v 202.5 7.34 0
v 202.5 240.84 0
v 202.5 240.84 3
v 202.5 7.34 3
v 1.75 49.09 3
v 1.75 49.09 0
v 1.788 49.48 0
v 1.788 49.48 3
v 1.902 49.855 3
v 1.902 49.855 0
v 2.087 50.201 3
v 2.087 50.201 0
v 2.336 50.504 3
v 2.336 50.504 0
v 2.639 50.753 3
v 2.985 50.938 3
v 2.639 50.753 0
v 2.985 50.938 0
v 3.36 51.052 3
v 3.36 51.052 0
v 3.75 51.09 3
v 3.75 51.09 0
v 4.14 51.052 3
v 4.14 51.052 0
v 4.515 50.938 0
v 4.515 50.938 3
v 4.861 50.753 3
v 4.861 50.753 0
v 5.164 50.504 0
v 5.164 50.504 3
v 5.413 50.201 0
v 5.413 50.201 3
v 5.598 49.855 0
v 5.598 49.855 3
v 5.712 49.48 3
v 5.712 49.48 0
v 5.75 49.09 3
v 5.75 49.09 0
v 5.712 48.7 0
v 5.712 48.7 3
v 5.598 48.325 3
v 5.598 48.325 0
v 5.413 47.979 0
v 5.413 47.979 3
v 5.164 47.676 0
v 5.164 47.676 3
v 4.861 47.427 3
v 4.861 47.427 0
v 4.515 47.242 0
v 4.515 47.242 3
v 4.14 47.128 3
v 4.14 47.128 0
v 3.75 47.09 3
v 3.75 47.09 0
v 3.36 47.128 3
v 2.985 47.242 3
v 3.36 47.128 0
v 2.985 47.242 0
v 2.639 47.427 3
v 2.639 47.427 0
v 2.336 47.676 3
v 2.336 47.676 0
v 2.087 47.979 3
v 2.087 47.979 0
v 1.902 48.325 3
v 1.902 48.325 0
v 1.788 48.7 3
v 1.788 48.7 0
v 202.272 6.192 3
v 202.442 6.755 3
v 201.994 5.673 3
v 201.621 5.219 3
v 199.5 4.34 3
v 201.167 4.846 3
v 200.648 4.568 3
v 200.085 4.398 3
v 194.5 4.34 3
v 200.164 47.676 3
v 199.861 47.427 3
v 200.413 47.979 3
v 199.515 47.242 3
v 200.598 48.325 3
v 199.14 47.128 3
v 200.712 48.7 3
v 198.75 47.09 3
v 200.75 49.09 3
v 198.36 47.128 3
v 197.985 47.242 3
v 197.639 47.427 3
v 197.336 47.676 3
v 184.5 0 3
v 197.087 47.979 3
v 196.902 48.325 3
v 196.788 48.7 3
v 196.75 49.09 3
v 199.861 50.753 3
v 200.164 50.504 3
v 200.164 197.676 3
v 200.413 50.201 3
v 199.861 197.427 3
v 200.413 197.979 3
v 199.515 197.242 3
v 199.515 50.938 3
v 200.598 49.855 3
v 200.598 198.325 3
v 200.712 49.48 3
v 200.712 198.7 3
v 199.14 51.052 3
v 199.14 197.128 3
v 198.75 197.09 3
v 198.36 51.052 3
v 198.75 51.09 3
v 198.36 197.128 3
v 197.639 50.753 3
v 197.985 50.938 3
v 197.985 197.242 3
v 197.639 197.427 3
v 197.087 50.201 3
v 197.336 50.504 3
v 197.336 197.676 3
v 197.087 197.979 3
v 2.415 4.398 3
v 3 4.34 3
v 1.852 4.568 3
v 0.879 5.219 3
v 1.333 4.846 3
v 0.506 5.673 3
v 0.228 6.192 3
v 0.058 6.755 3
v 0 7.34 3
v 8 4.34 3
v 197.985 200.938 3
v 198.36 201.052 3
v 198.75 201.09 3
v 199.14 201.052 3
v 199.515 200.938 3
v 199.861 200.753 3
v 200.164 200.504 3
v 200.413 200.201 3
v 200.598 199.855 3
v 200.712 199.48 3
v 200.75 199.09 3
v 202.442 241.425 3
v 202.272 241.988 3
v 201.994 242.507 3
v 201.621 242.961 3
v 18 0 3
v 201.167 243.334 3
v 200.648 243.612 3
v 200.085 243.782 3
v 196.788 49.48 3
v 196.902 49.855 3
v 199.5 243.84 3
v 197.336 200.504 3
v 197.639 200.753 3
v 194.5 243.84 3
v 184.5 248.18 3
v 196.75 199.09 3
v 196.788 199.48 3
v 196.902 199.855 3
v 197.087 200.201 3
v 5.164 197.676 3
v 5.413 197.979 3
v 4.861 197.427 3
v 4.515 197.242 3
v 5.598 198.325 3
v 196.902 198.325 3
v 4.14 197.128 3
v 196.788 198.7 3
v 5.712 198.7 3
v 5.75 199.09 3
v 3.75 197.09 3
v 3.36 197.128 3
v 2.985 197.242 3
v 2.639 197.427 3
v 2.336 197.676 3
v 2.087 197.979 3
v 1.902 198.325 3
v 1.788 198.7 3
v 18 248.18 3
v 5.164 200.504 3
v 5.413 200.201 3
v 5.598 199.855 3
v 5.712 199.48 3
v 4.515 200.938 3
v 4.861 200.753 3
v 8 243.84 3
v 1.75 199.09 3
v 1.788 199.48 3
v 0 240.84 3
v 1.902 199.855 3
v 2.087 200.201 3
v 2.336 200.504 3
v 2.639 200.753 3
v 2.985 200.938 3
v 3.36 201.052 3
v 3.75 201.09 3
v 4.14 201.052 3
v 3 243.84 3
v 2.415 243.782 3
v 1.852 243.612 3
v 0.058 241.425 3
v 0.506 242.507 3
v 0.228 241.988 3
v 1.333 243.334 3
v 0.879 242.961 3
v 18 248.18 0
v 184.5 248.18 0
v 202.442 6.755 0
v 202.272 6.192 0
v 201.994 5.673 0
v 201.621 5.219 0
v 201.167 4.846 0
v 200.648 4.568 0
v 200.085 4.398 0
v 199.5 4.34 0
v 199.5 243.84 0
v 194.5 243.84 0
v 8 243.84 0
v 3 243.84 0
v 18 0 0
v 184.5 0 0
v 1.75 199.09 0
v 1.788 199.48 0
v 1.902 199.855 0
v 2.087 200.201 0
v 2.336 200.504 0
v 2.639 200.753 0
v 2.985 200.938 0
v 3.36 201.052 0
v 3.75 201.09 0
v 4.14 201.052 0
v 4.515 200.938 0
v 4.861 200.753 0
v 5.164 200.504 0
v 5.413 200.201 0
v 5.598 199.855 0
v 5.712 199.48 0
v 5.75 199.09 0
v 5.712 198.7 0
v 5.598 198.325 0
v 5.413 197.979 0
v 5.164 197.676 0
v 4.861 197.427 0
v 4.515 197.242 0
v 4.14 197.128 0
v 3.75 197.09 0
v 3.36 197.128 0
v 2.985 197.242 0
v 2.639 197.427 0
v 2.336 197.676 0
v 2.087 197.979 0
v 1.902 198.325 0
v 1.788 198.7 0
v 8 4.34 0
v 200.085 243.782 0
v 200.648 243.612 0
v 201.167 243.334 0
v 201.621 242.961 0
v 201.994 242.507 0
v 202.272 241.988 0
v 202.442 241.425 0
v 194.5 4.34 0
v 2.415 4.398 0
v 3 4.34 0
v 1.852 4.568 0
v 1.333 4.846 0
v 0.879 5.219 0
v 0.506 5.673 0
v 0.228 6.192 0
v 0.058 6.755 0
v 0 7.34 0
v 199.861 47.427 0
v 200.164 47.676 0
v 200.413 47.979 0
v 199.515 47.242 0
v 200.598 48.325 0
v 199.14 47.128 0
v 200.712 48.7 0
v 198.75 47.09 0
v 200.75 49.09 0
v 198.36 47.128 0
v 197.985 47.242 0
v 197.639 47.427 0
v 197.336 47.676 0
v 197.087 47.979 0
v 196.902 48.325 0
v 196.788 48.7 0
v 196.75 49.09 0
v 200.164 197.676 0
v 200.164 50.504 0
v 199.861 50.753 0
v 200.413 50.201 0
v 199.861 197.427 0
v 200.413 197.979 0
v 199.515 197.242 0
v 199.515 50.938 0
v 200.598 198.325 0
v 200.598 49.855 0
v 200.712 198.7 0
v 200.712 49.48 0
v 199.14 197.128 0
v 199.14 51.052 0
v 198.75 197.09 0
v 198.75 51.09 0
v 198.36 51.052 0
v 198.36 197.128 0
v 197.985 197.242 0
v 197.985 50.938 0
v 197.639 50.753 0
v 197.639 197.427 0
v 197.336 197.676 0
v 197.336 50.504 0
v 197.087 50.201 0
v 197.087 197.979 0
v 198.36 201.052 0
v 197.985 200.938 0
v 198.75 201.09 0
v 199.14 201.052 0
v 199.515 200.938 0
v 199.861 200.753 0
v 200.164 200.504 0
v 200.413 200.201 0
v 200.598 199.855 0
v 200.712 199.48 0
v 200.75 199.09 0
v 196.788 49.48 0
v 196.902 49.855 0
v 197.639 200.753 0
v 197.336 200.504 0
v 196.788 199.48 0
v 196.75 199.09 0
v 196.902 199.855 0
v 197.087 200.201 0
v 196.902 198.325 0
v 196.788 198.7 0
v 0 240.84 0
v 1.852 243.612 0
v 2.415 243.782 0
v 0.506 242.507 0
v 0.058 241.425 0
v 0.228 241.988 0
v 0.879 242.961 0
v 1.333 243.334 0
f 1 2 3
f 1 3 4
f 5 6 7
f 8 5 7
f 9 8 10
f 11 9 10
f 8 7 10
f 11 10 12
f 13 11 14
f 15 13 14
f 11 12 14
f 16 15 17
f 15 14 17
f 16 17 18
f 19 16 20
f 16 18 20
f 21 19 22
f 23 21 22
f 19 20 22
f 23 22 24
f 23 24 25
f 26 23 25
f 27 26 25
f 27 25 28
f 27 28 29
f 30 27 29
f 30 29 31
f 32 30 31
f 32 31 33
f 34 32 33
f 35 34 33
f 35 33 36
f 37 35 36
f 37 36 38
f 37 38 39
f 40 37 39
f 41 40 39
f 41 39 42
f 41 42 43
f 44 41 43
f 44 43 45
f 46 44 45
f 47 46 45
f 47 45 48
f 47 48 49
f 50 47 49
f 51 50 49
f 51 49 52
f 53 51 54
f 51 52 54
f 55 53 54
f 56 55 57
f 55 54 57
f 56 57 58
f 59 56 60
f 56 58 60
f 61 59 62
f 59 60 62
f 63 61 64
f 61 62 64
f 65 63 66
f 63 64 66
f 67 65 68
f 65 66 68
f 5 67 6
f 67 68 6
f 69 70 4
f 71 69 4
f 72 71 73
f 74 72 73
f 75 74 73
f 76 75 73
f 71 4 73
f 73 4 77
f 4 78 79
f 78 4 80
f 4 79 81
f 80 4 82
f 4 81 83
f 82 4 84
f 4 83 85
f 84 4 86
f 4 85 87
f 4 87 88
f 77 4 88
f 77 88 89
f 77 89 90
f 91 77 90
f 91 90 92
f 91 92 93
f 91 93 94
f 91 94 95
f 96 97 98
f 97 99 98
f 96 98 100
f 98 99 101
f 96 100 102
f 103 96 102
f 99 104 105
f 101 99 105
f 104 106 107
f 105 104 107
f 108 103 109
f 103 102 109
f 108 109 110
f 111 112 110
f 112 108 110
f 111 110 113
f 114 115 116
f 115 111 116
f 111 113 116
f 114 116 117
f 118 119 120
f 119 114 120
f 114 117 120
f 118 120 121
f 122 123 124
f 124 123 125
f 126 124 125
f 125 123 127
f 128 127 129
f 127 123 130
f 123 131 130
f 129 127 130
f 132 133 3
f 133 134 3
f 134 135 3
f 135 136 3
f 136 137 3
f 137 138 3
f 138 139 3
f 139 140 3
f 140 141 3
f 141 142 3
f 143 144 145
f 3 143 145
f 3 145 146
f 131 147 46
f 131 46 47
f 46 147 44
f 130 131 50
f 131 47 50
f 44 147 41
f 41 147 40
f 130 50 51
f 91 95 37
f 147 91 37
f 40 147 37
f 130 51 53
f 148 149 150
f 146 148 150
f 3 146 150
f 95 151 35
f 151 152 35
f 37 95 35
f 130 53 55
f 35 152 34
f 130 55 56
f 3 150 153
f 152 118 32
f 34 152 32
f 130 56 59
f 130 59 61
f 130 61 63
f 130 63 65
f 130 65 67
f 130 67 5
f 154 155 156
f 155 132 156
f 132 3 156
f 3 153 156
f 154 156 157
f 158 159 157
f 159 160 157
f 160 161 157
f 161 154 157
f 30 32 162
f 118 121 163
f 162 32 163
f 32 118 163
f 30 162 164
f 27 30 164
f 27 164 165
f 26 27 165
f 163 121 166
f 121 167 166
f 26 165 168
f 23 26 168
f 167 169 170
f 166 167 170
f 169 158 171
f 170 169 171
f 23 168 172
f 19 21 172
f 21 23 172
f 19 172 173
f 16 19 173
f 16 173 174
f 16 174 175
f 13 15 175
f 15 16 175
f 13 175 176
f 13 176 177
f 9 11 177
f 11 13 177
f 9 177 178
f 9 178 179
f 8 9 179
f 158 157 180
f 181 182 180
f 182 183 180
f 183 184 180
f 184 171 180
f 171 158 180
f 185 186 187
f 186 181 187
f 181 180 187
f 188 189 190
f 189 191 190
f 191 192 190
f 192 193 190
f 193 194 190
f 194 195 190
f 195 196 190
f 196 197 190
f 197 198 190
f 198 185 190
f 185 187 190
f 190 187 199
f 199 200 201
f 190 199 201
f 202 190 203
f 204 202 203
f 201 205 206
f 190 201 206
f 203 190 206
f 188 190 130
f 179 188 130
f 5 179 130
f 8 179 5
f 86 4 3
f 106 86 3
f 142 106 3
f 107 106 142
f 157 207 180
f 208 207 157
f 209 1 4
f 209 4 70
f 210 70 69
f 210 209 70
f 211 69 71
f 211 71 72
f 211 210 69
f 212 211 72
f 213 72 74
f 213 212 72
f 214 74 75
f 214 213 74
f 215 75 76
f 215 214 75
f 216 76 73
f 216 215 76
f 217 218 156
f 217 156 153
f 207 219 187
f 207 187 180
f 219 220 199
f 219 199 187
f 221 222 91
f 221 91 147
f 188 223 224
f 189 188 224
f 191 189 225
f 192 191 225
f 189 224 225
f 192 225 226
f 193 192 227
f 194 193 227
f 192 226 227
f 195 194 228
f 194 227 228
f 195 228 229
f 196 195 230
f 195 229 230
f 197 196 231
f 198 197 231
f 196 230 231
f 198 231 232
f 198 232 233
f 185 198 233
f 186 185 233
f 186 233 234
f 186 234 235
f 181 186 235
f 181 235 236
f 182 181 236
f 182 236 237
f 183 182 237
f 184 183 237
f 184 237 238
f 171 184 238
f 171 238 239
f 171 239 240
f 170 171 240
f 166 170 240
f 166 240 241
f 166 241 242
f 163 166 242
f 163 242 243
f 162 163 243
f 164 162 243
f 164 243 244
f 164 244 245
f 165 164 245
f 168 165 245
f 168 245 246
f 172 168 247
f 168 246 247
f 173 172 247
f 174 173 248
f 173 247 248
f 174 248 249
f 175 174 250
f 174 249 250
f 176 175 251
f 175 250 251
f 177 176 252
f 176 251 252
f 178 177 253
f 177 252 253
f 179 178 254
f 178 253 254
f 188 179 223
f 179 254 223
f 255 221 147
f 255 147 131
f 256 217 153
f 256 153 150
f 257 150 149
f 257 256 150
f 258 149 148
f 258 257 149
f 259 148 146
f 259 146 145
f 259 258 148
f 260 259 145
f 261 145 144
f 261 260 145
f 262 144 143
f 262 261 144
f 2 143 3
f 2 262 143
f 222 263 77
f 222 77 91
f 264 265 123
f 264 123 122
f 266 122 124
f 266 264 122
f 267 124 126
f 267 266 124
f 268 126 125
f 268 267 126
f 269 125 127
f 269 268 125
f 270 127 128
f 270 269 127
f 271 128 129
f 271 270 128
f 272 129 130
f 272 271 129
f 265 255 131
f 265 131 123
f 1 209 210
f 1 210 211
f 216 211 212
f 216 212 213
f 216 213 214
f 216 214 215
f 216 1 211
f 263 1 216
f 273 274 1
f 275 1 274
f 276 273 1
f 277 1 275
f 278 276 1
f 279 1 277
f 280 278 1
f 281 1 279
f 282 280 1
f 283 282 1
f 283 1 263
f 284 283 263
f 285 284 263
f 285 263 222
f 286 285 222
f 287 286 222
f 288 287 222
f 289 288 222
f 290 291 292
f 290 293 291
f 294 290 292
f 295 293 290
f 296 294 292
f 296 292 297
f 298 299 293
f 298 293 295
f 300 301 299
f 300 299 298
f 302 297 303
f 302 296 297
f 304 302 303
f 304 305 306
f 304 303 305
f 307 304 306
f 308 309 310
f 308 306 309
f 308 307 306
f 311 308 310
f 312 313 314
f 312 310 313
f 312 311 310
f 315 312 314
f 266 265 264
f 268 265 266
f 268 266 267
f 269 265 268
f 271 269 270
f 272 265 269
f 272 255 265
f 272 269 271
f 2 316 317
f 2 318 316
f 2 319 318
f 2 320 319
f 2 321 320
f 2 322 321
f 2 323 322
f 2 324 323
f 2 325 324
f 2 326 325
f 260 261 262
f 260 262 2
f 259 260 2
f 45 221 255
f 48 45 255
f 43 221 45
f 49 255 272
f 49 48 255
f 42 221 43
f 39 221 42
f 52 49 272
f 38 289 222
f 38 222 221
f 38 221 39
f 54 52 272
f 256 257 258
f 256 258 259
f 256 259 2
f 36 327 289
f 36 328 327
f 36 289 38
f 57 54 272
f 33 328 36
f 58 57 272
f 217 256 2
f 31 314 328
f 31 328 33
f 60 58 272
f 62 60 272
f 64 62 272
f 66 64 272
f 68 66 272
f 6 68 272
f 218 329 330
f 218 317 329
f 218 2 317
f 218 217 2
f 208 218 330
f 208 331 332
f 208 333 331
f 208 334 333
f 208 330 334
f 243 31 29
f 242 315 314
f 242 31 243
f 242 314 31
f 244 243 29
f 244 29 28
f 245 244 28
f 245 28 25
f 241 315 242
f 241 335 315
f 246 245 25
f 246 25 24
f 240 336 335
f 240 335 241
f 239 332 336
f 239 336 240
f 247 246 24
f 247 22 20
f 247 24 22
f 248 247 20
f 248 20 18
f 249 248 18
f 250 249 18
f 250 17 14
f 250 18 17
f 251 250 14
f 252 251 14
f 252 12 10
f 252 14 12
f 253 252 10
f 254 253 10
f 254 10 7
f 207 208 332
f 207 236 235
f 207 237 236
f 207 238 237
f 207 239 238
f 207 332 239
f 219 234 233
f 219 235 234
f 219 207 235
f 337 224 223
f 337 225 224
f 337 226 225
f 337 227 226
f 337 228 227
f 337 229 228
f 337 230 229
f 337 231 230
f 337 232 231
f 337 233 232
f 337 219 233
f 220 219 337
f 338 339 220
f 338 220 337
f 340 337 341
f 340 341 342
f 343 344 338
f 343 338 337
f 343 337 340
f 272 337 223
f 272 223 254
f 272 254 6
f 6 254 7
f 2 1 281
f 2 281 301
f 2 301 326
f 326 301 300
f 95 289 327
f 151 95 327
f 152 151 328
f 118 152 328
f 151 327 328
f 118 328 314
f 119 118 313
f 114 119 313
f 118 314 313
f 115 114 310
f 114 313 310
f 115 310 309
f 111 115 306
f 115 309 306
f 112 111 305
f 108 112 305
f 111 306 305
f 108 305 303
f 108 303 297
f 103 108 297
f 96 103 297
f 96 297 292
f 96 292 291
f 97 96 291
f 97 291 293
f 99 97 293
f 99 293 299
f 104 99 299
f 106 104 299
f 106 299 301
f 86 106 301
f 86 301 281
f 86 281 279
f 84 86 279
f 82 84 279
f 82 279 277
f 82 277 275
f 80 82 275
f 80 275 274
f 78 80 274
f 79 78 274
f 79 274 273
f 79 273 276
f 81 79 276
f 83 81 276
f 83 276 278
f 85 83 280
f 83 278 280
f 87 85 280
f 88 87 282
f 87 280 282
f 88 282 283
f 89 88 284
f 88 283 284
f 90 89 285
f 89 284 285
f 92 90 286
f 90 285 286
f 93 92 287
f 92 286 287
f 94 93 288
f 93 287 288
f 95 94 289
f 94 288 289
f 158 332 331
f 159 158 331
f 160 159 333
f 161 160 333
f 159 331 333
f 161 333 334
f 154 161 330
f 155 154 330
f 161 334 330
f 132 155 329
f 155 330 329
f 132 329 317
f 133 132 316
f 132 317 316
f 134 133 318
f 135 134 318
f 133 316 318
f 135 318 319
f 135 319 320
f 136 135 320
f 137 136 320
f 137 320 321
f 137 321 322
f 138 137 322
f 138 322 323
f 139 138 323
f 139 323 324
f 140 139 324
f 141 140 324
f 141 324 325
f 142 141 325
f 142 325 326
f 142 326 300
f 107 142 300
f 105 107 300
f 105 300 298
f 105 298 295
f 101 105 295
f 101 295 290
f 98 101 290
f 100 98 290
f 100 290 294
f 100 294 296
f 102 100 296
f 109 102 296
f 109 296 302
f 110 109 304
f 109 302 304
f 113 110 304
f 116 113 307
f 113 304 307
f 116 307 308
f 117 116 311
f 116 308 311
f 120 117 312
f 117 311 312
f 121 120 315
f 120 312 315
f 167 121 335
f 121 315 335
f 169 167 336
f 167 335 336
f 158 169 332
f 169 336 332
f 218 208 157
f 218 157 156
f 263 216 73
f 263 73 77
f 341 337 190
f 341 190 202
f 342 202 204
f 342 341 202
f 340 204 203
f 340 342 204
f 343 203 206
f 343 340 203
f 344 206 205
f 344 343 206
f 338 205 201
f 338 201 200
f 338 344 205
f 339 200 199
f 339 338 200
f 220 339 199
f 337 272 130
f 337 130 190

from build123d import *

# Parameters (mm, degrees)
BOSS_EXTRUDE1_DEPTH   = 3
F_4_0MM_DOWEL_HOLE1_D = 4


with BuildPart() as part:
    # Sketch1 → Boss-Extrude1 (new body)
    with BuildSketch(Plane.XY):
        with BuildLine():
            Line((0, 7.34), (0, 240.84))
            ThreePointArc((0, 240.84), (0.878679656, 242.961320344), (3, 243.84))
            Line((3, 243.84), (8, 243.84))
            Line((8, 243.84), (18, 248.18))
            Line((18, 248.18), (184.5, 248.18))
            Line((184.5, 248.18), (194.5, 243.84))
            Line((194.5, 243.84), (199.5, 243.84))
            ThreePointArc((199.5, 243.84), (201.621320344, 242.961320344), (202.5, 240.84))
            Line((202.5, 240.84), (202.5, 7.34))
            ThreePointArc((202.5, 7.34), (201.621320344, 5.218679656), (199.5, 4.34))
            Line((199.5, 4.34), (194.5, 4.34))
            Line((194.5, 4.34), (184.5, 0))
            Line((184.5, 0), (18, 0))
            Line((18, 0), (8, 4.34))
            Line((8, 4.34), (3, 4.34))
            ThreePointArc((3, 4.34), (0.878679656, 5.218679656), (0, 7.34))
        make_face()
    extrude(amount=BOSS_EXTRUDE1_DEPTH)

    # Ø4.0mm Dowel Hole1 (through all)
    with Locations(Plane.XY.offset(3)):
        with Locations((3.75, 199.09), (3.75, 49.09), (198.75, 49.09), (198.75, 199.09)):
            Hole(F_4_0MM_DOWEL_HOLE1_D / 2)


solid = part.part
